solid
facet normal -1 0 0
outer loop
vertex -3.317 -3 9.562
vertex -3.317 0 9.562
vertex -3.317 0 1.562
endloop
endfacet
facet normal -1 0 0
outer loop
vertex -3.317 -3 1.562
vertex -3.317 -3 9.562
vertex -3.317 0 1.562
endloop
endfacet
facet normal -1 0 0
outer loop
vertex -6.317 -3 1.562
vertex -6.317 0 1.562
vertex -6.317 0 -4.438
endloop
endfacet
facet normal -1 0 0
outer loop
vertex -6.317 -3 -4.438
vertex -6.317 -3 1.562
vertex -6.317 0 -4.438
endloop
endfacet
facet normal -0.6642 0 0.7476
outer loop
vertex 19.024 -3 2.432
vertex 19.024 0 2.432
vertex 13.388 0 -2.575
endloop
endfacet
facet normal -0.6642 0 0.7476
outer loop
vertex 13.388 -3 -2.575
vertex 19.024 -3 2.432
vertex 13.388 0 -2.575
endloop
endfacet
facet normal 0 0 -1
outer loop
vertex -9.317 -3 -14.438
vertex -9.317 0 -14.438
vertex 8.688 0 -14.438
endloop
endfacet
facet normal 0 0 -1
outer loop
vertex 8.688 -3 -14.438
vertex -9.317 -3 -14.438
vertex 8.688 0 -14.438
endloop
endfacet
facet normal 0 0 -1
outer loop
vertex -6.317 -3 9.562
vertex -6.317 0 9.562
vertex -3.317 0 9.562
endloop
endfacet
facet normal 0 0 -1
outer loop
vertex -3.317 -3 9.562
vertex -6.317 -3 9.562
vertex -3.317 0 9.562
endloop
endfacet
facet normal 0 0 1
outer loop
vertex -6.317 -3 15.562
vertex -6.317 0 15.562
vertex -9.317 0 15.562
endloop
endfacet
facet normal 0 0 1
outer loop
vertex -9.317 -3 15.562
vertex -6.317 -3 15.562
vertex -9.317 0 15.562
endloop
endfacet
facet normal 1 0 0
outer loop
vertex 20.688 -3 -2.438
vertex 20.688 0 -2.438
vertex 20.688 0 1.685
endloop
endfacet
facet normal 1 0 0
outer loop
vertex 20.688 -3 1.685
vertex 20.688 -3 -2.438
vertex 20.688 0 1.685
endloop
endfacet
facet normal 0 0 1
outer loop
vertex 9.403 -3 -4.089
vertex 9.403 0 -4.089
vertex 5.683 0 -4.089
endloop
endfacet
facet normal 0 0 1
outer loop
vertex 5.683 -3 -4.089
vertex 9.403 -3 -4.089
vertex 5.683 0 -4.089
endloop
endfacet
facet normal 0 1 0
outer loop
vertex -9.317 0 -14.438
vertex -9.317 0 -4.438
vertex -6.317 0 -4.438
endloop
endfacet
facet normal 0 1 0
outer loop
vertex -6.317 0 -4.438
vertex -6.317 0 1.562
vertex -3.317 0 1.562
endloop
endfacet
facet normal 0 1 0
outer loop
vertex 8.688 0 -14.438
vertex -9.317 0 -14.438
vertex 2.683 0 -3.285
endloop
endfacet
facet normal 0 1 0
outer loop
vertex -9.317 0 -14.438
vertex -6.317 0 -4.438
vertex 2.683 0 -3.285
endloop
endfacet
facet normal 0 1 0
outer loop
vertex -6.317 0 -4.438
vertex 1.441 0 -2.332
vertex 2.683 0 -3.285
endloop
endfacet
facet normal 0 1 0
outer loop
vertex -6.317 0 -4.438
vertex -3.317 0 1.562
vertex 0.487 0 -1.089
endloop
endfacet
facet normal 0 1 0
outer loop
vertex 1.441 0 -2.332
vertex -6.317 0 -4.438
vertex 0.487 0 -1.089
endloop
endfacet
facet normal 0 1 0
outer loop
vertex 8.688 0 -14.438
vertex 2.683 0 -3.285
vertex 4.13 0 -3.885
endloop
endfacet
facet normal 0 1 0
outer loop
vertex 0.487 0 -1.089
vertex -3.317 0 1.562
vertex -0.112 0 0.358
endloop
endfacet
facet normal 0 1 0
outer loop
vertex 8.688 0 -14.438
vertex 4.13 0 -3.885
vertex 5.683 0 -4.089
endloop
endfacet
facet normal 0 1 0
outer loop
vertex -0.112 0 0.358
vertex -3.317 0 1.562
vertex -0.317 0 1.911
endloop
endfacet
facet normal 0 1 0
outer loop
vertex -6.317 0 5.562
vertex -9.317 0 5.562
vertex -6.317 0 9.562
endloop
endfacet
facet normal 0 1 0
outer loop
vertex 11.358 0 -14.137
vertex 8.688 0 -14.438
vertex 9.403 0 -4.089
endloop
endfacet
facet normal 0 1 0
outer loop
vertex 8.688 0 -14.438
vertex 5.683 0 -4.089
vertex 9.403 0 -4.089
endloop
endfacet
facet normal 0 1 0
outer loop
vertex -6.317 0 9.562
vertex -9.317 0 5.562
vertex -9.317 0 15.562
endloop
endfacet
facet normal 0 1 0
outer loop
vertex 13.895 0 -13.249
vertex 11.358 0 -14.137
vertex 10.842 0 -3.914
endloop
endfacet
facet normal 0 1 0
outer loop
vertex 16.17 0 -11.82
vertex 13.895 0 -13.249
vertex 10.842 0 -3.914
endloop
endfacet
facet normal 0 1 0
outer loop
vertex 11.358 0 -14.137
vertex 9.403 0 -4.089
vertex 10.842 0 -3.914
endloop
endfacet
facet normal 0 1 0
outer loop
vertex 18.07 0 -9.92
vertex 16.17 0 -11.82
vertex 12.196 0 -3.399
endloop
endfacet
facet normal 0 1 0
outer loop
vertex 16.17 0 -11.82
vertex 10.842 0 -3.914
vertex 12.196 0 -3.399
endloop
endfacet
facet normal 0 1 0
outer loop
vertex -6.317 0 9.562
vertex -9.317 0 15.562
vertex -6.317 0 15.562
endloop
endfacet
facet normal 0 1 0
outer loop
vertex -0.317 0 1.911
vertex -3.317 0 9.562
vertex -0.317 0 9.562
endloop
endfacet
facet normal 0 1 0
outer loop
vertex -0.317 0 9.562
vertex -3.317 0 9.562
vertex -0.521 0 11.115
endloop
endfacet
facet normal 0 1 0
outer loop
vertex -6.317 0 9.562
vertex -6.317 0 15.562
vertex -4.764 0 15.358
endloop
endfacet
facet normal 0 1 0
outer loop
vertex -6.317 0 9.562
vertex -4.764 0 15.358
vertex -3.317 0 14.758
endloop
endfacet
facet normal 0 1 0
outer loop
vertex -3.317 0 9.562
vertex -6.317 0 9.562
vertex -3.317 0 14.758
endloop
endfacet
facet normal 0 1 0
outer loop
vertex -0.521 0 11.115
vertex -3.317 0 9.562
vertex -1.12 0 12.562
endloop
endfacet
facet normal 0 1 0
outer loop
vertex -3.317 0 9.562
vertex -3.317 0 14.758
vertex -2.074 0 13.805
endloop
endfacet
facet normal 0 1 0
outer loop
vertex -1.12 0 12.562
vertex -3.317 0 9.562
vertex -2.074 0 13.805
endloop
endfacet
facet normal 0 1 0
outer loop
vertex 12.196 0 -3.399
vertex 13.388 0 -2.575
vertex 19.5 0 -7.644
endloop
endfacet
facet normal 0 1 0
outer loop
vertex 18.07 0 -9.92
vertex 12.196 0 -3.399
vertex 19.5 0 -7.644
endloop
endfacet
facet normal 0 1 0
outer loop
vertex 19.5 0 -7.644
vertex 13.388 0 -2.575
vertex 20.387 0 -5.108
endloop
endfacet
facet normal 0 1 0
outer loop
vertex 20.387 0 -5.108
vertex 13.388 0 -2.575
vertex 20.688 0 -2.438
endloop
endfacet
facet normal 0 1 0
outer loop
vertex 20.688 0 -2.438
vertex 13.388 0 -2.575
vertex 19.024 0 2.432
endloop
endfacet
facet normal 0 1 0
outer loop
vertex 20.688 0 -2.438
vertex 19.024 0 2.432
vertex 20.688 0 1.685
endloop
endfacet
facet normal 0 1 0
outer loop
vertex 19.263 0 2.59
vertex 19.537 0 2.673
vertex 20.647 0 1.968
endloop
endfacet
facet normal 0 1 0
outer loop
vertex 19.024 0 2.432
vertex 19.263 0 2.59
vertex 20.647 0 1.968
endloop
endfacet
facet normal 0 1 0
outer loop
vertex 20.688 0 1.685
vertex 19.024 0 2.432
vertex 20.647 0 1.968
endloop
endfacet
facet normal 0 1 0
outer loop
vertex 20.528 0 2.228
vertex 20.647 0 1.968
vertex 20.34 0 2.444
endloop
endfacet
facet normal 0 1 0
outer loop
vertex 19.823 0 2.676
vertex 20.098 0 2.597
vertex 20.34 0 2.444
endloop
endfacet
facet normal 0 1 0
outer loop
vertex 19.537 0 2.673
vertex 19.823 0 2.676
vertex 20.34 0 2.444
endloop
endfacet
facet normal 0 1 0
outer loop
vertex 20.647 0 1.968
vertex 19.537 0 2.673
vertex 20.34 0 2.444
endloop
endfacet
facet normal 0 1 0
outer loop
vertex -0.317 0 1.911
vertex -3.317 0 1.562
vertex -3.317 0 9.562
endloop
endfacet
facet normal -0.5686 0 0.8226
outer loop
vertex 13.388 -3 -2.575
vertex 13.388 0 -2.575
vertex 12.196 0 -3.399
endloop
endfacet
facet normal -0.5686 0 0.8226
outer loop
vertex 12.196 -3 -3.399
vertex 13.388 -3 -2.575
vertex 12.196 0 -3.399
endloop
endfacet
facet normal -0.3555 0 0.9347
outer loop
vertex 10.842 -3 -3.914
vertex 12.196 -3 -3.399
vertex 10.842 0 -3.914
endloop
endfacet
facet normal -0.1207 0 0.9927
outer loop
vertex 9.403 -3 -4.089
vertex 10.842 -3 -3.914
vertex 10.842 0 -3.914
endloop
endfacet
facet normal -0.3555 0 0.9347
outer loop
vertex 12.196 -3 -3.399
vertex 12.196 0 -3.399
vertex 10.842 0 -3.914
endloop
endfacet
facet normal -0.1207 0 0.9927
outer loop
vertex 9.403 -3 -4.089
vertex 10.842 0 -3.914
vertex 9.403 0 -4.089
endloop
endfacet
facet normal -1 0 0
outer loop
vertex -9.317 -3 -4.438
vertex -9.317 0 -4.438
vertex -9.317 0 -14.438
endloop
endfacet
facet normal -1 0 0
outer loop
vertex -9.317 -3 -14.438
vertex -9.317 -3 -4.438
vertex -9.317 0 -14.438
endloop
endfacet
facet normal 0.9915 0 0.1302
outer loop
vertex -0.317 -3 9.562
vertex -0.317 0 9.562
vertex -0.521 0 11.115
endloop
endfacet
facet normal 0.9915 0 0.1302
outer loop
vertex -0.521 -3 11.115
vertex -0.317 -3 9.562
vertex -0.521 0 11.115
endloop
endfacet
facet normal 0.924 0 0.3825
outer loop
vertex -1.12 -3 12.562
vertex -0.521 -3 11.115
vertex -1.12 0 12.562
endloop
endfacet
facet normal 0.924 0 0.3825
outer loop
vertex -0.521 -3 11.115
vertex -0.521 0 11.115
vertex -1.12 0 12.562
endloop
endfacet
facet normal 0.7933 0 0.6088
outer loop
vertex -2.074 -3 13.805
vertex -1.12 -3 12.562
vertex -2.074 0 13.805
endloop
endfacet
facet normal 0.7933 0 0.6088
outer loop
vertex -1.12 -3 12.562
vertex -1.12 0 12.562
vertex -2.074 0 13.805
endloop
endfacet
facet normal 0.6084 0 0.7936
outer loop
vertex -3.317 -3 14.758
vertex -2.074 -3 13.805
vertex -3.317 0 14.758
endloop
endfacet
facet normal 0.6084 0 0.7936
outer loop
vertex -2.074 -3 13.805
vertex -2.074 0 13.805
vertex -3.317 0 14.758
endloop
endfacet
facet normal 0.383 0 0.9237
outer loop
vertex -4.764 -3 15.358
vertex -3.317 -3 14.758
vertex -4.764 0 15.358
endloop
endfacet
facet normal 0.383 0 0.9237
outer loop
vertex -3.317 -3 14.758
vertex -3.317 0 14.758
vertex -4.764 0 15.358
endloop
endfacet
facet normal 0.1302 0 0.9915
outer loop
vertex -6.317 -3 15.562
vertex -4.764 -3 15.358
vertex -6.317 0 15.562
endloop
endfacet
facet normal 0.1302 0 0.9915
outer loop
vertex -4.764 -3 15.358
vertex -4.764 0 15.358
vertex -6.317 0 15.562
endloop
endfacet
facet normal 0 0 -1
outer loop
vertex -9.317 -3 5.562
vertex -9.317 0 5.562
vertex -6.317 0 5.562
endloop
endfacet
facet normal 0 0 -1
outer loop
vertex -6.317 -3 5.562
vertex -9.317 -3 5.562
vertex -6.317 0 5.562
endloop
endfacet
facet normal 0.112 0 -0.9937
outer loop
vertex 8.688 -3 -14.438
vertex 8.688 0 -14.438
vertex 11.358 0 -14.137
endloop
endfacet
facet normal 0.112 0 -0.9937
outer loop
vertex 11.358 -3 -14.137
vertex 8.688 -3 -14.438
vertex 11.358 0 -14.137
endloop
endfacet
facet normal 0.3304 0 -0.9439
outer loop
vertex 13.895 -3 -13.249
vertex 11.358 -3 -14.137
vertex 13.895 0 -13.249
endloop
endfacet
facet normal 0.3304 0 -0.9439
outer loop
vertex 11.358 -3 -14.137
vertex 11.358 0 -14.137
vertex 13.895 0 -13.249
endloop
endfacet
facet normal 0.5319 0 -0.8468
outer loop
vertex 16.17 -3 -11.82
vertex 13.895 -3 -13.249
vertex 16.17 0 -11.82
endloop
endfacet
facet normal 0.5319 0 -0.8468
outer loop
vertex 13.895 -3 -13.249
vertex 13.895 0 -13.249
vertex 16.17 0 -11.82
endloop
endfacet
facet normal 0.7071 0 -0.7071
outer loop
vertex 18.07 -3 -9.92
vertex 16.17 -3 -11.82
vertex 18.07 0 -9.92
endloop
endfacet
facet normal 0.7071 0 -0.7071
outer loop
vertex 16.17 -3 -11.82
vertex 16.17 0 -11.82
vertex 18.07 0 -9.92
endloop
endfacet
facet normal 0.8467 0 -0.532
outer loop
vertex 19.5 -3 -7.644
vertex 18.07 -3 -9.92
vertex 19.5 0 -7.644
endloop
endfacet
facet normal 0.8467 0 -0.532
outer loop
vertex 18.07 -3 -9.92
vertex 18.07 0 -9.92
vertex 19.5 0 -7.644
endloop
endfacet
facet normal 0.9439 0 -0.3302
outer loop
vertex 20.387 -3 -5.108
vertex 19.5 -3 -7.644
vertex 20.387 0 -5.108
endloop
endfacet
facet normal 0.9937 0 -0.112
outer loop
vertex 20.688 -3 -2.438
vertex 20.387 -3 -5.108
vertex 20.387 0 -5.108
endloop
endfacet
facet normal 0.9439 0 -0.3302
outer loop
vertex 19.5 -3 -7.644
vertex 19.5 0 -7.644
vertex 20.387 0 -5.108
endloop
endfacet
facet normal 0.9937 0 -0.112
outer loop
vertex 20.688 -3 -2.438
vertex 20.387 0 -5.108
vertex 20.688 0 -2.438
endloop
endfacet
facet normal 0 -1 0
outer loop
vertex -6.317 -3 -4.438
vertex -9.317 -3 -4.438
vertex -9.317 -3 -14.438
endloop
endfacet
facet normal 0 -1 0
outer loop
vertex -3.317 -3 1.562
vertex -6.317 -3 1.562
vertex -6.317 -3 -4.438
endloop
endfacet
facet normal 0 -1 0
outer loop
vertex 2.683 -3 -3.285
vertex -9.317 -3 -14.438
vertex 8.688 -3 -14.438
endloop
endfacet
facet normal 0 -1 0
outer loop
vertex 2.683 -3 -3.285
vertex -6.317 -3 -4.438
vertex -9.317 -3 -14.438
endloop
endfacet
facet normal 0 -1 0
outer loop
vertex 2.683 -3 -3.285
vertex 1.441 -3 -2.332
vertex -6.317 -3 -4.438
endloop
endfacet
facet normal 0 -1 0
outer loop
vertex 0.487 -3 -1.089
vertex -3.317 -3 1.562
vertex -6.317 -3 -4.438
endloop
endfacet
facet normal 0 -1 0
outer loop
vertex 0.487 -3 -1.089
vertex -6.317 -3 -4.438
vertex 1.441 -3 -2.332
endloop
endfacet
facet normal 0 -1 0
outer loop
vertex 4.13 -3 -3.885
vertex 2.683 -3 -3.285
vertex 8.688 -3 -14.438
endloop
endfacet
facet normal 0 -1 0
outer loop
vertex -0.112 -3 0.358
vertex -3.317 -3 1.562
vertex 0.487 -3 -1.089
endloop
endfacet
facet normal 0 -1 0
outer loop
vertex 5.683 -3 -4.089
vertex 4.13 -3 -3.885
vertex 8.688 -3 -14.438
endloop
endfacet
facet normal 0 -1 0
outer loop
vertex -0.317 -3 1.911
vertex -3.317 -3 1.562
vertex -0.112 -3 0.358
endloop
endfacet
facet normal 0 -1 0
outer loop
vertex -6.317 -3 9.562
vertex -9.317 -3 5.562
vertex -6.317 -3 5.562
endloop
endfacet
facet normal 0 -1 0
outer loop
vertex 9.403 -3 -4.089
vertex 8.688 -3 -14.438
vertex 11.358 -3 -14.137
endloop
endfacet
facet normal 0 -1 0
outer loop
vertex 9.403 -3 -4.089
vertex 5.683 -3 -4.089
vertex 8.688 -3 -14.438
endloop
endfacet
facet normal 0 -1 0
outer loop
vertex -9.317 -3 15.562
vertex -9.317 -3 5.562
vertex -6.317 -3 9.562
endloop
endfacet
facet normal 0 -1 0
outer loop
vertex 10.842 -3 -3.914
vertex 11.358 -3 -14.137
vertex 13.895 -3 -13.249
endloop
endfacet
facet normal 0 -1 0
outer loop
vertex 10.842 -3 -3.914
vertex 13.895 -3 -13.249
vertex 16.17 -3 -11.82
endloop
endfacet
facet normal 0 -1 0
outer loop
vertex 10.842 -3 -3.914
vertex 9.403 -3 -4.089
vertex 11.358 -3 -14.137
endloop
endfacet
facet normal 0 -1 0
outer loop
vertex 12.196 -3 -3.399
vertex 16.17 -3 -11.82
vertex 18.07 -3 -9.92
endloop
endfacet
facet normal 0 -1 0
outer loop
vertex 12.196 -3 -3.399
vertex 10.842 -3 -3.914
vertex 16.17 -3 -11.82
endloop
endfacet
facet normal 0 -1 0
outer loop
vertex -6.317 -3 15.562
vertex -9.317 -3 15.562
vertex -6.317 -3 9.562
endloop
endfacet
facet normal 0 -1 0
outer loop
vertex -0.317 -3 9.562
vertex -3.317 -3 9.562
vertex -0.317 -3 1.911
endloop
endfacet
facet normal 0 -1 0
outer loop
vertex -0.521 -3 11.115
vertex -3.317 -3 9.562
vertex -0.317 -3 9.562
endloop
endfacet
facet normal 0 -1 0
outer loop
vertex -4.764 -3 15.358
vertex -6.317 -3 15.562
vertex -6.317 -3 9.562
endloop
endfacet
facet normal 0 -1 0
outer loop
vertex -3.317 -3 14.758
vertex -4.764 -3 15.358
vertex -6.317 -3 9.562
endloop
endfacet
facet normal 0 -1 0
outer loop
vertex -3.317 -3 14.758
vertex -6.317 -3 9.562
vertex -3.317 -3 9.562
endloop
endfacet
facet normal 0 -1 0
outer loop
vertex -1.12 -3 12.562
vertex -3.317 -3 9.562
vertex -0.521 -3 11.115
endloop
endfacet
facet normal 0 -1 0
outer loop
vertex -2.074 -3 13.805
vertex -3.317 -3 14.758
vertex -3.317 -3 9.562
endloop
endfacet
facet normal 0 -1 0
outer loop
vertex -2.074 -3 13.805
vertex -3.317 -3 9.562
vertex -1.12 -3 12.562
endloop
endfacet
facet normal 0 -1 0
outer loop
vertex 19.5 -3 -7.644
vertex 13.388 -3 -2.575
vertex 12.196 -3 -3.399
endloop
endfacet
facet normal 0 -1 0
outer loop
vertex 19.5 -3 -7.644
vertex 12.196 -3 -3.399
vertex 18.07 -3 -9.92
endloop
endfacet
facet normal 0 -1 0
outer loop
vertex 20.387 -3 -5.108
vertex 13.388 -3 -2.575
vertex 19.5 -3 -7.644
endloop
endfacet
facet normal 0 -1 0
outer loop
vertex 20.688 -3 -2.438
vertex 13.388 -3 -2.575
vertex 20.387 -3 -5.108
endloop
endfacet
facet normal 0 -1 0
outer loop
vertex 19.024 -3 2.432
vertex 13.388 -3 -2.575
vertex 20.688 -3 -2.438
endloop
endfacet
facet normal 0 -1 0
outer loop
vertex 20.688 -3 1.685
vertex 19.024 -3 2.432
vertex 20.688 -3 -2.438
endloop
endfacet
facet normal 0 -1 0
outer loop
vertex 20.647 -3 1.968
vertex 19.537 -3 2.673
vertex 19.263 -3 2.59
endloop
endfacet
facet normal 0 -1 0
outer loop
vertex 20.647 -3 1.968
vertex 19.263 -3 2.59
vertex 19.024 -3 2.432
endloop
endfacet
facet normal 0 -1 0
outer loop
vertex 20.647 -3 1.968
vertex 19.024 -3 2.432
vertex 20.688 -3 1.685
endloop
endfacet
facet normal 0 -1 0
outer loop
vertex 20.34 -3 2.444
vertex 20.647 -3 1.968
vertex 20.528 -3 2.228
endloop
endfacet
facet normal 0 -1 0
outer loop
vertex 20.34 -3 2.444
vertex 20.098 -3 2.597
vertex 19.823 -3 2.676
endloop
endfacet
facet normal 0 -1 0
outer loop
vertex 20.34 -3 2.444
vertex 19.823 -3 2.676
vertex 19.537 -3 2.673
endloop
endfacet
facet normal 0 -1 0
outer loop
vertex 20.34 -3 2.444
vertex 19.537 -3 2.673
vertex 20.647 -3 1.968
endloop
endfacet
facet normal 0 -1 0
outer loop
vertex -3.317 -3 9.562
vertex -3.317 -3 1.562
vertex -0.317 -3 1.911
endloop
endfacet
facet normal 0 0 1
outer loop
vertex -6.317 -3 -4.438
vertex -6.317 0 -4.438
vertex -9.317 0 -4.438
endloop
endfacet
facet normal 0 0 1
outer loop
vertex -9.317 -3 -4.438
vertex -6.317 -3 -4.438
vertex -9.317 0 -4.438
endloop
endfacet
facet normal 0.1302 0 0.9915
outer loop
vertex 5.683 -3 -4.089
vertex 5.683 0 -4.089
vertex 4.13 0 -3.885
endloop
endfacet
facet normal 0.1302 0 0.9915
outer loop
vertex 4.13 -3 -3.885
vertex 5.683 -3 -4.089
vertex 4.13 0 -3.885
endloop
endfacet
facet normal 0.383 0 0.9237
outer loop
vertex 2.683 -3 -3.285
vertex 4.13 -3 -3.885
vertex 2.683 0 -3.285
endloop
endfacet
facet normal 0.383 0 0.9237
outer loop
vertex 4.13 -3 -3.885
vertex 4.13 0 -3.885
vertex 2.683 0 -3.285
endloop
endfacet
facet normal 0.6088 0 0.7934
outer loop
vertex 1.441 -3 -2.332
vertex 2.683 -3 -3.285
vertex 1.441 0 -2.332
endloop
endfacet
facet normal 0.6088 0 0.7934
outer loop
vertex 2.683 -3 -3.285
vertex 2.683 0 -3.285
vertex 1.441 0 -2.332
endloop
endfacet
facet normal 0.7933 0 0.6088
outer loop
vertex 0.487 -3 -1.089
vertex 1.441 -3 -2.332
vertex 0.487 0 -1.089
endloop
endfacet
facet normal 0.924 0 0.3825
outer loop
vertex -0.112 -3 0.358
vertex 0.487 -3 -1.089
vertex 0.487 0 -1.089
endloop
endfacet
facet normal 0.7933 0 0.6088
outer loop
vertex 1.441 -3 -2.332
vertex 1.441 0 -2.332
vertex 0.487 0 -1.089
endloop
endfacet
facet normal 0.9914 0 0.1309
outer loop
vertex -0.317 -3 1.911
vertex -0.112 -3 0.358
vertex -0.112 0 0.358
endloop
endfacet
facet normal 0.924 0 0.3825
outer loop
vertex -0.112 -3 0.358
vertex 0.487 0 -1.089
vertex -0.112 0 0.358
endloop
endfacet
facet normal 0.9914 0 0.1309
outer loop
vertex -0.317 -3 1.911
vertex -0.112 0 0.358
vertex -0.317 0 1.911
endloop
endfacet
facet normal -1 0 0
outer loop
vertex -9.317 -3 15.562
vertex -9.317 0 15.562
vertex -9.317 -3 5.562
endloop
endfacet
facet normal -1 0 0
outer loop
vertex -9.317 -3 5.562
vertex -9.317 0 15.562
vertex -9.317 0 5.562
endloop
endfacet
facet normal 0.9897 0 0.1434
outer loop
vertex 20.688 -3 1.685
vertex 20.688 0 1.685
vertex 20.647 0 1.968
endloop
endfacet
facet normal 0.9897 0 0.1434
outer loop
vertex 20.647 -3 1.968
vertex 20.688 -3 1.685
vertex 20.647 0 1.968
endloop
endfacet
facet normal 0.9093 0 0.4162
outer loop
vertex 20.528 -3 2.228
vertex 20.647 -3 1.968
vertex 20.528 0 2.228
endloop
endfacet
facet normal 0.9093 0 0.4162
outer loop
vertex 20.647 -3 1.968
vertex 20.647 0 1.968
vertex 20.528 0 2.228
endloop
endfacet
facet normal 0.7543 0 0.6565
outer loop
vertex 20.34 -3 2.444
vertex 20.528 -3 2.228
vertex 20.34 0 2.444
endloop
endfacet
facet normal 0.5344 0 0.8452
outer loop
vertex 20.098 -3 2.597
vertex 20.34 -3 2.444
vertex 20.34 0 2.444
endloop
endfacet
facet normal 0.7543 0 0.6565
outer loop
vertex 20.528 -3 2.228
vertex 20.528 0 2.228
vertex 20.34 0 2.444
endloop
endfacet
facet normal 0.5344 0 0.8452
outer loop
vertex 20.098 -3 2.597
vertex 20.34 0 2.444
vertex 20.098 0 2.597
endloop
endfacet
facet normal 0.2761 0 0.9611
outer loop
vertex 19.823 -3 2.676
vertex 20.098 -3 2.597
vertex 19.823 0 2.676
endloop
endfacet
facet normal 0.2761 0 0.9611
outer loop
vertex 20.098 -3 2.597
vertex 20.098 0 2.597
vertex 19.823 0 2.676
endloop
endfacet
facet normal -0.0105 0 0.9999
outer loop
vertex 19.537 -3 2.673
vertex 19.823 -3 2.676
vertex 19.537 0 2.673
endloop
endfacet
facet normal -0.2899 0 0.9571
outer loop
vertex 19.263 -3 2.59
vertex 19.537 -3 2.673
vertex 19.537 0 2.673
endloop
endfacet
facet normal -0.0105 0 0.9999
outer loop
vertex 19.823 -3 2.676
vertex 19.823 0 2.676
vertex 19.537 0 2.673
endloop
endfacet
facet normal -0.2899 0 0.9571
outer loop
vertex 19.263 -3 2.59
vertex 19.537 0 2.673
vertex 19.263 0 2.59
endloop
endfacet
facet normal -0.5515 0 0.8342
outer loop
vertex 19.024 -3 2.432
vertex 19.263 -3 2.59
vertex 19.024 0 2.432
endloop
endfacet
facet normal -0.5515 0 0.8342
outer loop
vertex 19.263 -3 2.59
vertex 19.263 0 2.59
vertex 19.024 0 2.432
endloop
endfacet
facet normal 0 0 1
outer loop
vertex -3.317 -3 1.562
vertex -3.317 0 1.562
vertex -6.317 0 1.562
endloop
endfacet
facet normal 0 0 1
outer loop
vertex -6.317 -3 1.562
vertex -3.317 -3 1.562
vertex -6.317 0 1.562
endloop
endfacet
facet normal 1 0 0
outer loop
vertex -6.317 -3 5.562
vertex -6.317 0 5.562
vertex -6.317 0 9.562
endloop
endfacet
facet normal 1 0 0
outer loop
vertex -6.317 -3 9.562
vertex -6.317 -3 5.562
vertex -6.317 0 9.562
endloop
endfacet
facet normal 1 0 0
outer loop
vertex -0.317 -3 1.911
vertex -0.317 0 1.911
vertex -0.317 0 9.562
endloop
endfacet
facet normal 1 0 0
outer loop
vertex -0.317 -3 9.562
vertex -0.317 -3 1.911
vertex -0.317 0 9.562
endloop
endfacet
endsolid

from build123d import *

# Parameters (mm, degrees)
F1_DEPTH = 3


with BuildPart() as f1:
    # F0 (on Front) → F1 (new body)
    with BuildSketch(Plane.XZ):
        with BuildLine():
            Line((-9.316623, -4.437705), (-9.316623, -14.437705))
            Line((-9.316623, -14.437705), (8.688183, -14.437705))
            ThreePointArc((8.688183, -14.437705), (17.173464, -10.922987), (20.688183, -2.437705))
            Line((20.688183, -2.437705), (20.688183, 1.684763))
            ThreePointArc((20.688183, 1.684763), (20.09796, 2.596949), (19.024017, 2.432348))
            Line((19.024017, 2.432348), (13.388086, -2.574695))
            ThreePointArc((13.388086, -2.574695), (11.534632, -3.697795), (9.403091, -4.089183))
            Line((9.403091, -4.089183), (5.683377, -4.089183))
            ThreePointArc((5.683377, -4.089183), (1.440737, -2.331823), (-0.316623, 1.910817))
            Line((-0.316623, 1.910817), (-0.316623, 9.562295))
            ThreePointArc((-0.316623, 9.562295), (-2.073982, 13.804935), (-6.316623, 15.562295))
            Line((-6.316623, 15.562295), (-9.316623, 15.562295))
            Line((-9.316623, 15.562295), (-9.316623, 5.562295))
            Line((-9.316623, 5.562295), (-6.316623, 5.562295))
            Line((-6.316623, 5.562295), (-6.316623, 9.562295))
            Line((-6.316623, 9.562295), (-3.316623, 9.562295))
            Line((-3.316623, 9.562295), (-3.316623, 1.562295))
            Line((-3.316623, 1.562295), (-6.316623, 1.562295))
            Line((-6.316623, 1.562295), (-6.316623, -4.437705))
            Line((-6.316623, -4.437705), (-9.316623, -4.437705))
        make_face()
    extrude(amount=F1_DEPTH)


solid = f1.part
